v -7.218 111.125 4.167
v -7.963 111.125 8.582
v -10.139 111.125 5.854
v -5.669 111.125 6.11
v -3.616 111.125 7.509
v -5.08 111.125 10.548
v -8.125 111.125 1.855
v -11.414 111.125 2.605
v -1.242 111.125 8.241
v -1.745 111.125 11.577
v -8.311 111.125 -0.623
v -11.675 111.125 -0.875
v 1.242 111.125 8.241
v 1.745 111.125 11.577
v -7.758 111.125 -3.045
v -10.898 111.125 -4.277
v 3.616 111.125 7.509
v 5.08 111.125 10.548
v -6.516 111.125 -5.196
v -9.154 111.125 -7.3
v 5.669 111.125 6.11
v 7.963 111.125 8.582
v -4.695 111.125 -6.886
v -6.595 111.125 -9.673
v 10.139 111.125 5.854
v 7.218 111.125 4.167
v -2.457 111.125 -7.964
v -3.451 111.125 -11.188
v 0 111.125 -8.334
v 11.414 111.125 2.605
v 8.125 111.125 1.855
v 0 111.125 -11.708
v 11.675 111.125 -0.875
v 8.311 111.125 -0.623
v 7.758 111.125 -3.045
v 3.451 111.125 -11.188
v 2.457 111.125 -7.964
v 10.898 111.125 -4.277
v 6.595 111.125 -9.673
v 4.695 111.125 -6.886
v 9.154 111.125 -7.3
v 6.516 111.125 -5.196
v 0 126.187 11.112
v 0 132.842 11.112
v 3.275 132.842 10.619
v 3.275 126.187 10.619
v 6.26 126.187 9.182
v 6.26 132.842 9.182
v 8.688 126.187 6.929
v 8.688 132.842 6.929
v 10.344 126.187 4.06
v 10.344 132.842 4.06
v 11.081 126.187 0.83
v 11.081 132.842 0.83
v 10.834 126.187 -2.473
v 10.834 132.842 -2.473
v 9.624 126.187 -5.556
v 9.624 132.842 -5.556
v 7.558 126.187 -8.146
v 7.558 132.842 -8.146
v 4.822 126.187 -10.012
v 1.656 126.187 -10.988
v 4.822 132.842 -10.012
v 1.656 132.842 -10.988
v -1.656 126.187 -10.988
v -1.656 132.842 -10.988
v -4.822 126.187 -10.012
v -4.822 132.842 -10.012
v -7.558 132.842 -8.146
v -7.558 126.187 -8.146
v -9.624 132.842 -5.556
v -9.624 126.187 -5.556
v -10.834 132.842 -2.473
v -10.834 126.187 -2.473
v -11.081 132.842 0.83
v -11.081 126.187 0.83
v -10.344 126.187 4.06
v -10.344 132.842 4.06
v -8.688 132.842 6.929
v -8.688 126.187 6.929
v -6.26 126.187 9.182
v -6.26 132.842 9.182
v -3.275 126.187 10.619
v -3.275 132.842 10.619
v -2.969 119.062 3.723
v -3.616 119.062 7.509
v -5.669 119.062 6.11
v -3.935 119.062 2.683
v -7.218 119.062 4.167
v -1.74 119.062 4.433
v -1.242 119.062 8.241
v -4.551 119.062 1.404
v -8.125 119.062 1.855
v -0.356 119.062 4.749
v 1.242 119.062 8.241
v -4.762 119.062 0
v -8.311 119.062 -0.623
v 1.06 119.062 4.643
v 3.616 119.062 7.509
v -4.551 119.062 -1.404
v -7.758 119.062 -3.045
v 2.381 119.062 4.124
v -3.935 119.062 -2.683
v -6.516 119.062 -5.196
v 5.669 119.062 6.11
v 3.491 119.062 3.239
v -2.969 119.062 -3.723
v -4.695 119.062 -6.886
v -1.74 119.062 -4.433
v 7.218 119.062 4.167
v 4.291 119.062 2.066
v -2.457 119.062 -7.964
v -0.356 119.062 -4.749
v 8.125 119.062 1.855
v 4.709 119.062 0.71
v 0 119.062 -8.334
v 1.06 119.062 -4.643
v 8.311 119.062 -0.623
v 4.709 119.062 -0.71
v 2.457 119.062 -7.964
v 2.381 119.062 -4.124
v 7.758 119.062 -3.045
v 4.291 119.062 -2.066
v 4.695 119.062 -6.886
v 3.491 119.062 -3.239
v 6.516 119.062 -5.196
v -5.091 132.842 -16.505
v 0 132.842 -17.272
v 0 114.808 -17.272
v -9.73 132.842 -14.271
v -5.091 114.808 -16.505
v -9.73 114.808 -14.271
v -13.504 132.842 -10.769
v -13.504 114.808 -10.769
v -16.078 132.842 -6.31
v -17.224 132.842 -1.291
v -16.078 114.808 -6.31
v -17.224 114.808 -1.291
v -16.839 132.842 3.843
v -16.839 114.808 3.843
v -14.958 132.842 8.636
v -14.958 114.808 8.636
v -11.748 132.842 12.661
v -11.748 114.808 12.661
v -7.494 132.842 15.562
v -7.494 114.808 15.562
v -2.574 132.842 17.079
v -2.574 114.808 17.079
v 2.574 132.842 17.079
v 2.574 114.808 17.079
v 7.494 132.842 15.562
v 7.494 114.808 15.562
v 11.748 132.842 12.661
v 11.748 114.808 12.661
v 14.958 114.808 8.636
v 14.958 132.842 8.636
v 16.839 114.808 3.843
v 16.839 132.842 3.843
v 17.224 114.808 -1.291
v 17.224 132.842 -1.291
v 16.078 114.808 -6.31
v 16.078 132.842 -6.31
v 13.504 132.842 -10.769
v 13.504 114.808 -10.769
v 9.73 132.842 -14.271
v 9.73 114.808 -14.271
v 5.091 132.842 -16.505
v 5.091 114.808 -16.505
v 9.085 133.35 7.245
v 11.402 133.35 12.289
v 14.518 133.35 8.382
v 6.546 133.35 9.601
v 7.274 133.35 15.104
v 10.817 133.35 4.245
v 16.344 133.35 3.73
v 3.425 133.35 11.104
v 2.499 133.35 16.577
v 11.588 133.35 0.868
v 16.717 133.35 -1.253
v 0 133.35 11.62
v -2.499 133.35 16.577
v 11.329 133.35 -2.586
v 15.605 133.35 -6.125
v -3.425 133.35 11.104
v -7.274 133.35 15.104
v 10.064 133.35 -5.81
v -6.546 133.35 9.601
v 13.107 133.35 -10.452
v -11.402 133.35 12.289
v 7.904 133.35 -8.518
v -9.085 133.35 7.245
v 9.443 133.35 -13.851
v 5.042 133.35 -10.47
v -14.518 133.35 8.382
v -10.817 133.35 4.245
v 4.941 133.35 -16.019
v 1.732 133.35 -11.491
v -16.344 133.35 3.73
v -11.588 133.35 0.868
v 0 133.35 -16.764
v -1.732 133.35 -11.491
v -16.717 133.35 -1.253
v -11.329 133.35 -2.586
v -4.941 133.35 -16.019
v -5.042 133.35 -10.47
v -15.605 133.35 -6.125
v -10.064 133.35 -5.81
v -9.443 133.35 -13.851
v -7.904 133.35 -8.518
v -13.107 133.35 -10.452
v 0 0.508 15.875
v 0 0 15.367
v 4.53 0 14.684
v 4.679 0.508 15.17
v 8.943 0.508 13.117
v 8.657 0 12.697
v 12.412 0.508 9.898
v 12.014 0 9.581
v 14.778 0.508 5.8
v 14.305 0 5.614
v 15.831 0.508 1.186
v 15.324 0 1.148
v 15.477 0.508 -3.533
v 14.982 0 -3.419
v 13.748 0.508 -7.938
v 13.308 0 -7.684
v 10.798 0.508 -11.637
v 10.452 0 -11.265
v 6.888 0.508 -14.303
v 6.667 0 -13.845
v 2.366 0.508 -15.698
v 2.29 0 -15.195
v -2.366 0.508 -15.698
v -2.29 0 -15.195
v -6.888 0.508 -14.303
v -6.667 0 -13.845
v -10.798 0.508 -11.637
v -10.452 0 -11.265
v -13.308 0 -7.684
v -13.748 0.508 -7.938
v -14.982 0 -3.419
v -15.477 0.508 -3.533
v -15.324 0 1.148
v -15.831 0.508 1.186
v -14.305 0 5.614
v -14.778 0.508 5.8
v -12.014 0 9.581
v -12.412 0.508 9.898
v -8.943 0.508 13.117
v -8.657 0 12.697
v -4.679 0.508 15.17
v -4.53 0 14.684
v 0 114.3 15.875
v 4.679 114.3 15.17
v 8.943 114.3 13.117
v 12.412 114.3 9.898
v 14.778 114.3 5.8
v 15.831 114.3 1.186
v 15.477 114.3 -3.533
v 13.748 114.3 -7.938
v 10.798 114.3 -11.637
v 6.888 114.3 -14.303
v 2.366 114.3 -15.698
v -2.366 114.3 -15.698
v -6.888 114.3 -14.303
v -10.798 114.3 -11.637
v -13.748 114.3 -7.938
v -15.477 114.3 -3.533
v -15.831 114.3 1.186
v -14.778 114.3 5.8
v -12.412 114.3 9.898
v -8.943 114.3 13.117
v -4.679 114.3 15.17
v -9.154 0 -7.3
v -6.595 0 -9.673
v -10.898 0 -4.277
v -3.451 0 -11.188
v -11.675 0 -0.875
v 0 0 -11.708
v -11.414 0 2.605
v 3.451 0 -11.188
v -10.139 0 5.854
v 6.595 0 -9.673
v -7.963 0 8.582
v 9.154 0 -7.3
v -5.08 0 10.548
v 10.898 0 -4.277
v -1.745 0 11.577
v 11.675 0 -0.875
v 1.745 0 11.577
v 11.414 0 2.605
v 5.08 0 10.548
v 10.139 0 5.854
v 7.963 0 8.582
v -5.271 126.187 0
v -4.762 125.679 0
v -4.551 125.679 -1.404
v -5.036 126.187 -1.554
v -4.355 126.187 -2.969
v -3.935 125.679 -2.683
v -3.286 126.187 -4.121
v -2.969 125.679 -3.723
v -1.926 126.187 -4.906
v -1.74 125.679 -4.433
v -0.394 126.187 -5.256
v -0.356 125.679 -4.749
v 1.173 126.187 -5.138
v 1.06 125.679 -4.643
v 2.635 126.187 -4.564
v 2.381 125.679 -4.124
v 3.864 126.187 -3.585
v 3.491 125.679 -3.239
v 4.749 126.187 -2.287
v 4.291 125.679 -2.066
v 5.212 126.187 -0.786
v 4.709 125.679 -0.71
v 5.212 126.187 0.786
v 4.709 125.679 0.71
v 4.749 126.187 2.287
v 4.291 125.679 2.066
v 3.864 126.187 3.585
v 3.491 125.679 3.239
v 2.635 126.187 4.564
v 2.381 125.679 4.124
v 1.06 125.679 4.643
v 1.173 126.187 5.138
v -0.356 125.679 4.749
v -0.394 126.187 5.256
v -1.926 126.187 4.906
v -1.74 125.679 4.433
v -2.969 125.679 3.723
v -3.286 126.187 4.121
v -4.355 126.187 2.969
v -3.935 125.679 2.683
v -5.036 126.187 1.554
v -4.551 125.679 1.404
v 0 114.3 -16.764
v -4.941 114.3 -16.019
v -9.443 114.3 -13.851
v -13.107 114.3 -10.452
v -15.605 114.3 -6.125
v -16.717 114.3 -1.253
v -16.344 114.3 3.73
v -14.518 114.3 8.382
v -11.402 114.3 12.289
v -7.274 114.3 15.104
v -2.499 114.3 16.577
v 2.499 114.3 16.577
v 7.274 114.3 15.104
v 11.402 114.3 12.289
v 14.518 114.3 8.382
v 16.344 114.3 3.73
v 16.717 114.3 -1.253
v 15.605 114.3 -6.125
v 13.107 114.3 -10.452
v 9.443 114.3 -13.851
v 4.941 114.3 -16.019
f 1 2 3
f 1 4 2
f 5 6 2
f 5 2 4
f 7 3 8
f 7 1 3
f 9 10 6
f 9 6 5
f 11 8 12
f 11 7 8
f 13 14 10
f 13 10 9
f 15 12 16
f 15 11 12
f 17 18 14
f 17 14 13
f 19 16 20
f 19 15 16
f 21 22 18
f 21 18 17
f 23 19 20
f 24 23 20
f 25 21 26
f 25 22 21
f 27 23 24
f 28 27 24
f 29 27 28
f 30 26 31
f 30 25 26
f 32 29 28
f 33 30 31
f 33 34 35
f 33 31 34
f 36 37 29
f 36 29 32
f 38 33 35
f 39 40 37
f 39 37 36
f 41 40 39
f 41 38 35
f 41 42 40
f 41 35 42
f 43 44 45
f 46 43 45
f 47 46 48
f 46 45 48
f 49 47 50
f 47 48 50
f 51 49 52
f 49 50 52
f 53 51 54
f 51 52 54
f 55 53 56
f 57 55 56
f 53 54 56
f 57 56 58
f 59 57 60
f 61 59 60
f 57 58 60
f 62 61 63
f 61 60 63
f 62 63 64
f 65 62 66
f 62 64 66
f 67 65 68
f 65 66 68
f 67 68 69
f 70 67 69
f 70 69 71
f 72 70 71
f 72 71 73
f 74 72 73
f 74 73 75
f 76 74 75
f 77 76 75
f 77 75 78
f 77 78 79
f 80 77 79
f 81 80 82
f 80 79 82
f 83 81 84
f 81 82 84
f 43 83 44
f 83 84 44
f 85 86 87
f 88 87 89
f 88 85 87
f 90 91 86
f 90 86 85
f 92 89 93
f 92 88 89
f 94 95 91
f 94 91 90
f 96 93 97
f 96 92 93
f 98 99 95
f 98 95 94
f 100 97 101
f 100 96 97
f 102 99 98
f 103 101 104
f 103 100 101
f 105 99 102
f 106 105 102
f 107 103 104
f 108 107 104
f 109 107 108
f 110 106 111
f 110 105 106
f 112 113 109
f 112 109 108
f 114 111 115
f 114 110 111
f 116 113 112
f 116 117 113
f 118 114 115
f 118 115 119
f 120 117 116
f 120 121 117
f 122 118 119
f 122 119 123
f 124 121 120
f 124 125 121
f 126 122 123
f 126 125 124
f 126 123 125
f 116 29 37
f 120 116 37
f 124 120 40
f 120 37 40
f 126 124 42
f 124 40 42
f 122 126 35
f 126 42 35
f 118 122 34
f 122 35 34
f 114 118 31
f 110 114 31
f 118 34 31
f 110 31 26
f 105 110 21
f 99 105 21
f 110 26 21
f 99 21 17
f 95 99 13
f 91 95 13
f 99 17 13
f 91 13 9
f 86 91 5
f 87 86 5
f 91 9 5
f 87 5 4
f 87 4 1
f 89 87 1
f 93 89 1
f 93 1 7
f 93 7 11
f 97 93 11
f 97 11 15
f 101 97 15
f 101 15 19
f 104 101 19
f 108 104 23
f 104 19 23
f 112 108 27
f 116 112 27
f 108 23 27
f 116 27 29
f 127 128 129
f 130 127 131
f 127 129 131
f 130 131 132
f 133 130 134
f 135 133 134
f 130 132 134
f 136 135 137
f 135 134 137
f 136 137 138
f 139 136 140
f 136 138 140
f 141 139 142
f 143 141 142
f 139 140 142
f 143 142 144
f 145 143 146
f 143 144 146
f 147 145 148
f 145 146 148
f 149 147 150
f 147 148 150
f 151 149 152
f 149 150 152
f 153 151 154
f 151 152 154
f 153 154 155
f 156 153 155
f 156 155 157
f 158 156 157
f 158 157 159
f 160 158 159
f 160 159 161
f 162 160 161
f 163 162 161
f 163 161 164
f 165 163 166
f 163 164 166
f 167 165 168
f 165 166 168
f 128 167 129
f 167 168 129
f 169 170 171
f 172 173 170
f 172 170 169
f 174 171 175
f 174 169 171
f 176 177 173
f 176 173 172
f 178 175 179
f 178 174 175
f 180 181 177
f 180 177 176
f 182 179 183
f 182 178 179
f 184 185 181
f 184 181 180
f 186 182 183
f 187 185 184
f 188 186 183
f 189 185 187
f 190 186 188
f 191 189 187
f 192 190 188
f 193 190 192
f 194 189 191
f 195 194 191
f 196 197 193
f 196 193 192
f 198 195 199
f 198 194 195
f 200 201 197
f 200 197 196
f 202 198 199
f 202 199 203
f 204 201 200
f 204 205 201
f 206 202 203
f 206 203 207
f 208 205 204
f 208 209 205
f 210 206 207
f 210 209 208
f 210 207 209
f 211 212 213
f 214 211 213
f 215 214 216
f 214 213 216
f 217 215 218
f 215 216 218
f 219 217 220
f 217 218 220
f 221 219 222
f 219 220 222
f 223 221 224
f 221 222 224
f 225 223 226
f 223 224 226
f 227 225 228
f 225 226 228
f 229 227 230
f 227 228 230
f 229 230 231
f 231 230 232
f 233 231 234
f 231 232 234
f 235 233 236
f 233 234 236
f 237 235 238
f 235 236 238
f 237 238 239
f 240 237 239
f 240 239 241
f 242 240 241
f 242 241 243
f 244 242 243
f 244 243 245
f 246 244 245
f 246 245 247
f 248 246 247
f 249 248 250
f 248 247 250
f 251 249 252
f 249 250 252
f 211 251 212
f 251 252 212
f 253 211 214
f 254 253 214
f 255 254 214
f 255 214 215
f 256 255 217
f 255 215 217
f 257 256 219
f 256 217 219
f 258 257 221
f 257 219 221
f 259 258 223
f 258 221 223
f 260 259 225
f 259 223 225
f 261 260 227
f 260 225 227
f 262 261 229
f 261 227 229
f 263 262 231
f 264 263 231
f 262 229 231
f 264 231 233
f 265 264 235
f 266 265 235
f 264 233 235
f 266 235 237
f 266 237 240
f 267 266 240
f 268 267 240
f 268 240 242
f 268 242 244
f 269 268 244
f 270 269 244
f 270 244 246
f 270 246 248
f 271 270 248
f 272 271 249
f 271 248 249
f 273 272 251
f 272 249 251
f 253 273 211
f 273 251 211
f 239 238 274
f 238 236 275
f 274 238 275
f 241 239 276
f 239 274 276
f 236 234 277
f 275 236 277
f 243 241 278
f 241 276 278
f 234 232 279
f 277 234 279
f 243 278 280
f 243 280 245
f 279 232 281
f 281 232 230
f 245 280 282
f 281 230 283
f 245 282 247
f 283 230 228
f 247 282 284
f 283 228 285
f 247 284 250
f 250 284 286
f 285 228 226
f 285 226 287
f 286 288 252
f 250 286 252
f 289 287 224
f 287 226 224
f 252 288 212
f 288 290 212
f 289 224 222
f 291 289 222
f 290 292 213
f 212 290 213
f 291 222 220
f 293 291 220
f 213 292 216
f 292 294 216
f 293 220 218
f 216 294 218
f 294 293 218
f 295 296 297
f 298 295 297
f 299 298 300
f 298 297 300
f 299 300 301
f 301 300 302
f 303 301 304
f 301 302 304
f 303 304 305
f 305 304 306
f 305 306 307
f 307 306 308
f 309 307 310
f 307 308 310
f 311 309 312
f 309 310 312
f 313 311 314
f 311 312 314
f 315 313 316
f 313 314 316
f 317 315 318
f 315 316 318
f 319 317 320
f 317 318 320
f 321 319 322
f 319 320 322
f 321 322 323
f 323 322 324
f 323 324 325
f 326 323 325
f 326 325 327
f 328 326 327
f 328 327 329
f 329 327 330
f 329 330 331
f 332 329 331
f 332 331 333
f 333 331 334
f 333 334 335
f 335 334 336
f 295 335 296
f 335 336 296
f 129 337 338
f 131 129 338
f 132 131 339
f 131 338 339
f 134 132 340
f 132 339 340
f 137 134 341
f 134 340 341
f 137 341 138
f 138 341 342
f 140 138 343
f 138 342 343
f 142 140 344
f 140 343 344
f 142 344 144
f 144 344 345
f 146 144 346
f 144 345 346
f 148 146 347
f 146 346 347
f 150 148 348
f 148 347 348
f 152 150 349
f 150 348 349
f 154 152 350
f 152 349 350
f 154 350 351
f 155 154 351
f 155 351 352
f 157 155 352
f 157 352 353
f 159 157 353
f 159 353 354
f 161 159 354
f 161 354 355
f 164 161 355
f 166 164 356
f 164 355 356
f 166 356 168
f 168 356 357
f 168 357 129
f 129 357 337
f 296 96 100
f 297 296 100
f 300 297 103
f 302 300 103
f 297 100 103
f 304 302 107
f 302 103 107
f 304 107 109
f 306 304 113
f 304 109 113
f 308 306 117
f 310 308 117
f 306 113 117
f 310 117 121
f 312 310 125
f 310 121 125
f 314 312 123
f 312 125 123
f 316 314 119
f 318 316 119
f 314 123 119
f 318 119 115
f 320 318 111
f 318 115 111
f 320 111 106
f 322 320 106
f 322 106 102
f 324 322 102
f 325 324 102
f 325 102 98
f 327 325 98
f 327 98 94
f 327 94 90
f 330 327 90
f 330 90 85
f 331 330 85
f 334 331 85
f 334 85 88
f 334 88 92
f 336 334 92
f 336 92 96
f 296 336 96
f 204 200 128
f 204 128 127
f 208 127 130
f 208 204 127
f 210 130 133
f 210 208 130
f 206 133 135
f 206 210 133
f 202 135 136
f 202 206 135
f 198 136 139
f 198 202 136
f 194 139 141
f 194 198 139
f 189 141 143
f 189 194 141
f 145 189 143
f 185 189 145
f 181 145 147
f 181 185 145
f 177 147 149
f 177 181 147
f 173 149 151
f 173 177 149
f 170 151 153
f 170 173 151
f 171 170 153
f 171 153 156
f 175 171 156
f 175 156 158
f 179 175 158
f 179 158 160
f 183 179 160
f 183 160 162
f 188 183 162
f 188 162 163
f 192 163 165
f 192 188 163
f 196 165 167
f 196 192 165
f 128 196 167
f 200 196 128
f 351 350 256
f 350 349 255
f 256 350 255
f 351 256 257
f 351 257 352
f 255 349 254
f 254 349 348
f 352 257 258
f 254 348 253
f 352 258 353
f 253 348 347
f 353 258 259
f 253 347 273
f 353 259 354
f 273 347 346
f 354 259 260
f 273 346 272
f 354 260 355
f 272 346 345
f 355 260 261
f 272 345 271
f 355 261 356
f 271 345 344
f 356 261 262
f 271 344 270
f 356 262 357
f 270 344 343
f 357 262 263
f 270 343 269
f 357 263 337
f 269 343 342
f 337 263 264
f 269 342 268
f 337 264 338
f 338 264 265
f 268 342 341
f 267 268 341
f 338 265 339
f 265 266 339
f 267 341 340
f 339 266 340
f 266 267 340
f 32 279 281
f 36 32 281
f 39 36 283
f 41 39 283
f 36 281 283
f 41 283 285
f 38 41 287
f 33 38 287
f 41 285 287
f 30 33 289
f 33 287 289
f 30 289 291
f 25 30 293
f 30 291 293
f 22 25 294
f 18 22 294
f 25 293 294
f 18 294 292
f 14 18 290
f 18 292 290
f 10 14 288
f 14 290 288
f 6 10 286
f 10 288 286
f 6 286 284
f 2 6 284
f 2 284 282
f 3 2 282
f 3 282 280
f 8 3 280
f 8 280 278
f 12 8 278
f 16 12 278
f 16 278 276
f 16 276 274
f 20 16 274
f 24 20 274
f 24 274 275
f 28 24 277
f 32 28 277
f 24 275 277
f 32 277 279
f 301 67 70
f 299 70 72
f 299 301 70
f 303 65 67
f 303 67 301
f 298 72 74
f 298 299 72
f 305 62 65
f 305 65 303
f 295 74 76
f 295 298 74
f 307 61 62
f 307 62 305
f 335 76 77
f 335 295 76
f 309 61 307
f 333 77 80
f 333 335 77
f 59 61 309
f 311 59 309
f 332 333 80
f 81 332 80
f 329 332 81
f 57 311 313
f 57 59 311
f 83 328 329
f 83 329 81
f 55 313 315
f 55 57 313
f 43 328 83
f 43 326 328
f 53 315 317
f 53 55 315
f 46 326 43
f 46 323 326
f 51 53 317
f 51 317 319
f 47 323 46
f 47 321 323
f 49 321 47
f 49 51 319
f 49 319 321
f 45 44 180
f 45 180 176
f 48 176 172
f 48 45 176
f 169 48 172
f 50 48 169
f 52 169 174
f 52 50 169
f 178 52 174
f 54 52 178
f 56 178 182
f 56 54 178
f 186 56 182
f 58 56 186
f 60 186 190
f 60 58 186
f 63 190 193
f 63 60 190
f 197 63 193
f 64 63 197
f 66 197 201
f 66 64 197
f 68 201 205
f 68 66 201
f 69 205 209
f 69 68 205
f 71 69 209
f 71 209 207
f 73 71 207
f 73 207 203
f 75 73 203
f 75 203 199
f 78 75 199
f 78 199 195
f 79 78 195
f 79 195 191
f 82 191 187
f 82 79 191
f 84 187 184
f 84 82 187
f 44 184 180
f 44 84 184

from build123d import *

# Parameters (mm, degrees)
SKETCH1_R                    = 15.875
BOSS_EXTRUDE1_DEPTH          = 114.3
SKETCH2_R                    = 17.272
BOSS_EXTRUDE2_DEPTH          = 19.05
SKETCH10_R                   = 11.1125
CUT_EXTRUDE1_DEPTH           = 7.1628
F_3_8_0_375_DIAMETER_HOLE1_D = 9.525
SKETCH15_R                   = 11.7078125
CUT_EXTRUDE3_DEPTH           = 111.125
SKETCH16_R                   = 8.334375
CUT_EXTRUDE4_DEPTH           = 7.9375
CHAMFER2_SIZE                = 0.508


with BuildPart() as part:
    # Sketch1 → Boss-Extrude1 (new body)
    with BuildSketch(Plane(origin=(0, 0, 0), x_dir=(1, 0, 0), z_dir=(0, 1, 0))):
        with Locations(Location((0, 0, 0), (0, 0, 270))):
            Circle(SKETCH1_R)
    extrude(amount=BOSS_EXTRUDE1_DEPTH)

    # Sketch2 → Boss-Extrude2 (add)
    with BuildSketch(Plane(origin=(0, 114.3, 0), x_dir=(1, 0, 0), z_dir=(0, 1, 0))):
        with Locations(Location((0, 0, 0), (0, 0, 90))):
            Circle(SKETCH2_R)
    extrude(amount=BOSS_EXTRUDE2_DEPTH)

    # Sketch10 → Cut-Extrude1 (cut)
    with BuildSketch(Plane(origin=(0, 133.35, 0), x_dir=(1, 0, 0), z_dir=(0, 1, 0))):
        with Locations(Location((0, 0, 0), (0, 0, 270))):
            Circle(SKETCH10_R)
    extrude(amount=-CUT_EXTRUDE1_DEPTH, mode=Mode.SUBTRACT)

    # 3/8 (0.375) Diameter Hole1 (through all)
    with Locations(Plane(origin=(0, 126.1872, 0), x_dir=(1, 0, 0), z_dir=(0, 1, 0))):
        with Locations((0, 0)):
            Hole(F_3_8_0_375_DIAMETER_HOLE1_D / 2)

    # Sketch15 → Cut-Extrude3 (cut)
    with BuildSketch(Plane.XZ):
        with Locations(Location((0, 0, 0), (0, 0, 270))):
            Circle(SKETCH15_R)
    extrude(amount=-CUT_EXTRUDE3_DEPTH, mode=Mode.SUBTRACT)

    # Sketch16 → Cut-Extrude4 (cut)
    with BuildSketch(Plane.XZ.offset(-111.125)):
        with Locations(Location((0, 0, 0), (0, 0, 270))):
            Circle(SKETCH16_R)
    extrude(amount=-CUT_EXTRUDE4_DEPTH, mode=Mode.SUBTRACT)

    # Chamfer2
    chamfer2_edges = [part.edges().sort_by_distance(p)[0] for p in [
        (0, 133.35, -11.1125),
        (4.7625, 126.1872, 0),
        (0, 0, -15.875),
        (0, 114.3, 17.272),
        (0, 133.35, 17.272),
    ]]
    chamfer(chamfer2_edges, length=CHAMFER2_SIZE)


solid = part.part
